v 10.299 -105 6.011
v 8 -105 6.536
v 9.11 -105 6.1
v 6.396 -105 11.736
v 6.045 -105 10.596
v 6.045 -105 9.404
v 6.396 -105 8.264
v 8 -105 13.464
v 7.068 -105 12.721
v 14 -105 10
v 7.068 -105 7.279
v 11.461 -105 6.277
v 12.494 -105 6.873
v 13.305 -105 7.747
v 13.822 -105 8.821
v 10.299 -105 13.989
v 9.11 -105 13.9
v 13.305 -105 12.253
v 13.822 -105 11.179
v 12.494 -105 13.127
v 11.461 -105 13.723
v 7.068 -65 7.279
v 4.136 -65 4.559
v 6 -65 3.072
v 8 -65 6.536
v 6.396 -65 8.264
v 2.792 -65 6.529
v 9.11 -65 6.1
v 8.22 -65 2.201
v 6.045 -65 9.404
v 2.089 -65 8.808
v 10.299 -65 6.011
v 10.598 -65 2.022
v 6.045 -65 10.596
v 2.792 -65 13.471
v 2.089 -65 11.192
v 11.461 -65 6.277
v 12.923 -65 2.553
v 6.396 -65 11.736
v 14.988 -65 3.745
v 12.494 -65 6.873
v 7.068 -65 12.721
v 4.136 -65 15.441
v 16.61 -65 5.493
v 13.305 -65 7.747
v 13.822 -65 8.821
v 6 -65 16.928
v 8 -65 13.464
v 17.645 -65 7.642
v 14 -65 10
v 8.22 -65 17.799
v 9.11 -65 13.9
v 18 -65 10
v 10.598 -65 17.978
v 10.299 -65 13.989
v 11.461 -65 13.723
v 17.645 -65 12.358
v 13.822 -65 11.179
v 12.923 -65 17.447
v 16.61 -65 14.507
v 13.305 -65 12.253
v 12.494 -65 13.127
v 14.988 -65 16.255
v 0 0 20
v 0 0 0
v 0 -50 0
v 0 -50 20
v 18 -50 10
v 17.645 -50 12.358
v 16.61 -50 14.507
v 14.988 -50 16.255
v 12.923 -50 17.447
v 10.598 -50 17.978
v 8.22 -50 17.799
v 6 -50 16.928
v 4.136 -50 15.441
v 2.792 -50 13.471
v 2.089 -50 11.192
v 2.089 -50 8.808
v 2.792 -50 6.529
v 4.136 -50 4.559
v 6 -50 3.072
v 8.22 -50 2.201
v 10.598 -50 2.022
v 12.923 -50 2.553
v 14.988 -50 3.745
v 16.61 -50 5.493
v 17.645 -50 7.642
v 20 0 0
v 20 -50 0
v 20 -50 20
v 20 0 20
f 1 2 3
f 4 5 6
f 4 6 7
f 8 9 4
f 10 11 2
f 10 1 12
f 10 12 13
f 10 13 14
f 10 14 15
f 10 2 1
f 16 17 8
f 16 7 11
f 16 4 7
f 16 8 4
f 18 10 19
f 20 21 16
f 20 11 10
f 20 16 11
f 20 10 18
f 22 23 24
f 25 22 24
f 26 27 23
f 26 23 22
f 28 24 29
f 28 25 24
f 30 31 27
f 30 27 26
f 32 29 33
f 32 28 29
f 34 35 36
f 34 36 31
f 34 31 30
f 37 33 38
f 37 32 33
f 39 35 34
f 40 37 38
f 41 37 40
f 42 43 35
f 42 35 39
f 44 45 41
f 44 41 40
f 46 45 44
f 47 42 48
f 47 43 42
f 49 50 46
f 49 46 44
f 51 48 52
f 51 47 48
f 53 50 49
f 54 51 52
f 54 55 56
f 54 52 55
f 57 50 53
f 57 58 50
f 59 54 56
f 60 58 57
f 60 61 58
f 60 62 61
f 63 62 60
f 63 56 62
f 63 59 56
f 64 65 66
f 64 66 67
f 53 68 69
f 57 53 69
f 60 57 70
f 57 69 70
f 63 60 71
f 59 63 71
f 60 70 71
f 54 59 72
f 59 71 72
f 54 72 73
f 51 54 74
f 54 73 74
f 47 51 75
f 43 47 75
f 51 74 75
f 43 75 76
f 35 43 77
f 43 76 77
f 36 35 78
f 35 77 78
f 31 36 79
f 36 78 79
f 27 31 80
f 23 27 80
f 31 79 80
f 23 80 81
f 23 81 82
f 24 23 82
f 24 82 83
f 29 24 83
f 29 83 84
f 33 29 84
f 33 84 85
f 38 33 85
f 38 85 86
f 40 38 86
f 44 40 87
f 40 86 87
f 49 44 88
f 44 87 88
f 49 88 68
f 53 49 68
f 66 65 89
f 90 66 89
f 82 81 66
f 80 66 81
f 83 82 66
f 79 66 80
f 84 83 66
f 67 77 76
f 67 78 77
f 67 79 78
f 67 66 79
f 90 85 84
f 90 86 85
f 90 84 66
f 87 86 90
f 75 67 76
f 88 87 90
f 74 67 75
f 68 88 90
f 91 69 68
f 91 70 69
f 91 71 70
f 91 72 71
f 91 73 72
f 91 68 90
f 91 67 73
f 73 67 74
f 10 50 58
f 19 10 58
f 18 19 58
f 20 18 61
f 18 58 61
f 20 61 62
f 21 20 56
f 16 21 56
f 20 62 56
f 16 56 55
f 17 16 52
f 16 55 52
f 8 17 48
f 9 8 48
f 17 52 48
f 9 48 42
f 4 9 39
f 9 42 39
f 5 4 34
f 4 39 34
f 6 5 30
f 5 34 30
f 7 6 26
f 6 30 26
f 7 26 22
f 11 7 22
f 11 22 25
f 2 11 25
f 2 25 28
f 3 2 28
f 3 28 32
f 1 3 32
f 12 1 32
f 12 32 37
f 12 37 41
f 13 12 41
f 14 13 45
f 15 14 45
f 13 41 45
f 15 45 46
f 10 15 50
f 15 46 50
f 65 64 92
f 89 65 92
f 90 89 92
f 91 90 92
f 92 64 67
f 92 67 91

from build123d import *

# Parameters (mm, degrees)
F0_W     = 20
F0_H     = 20
F1_DEPTH = 50
F2_R     = 8
F3_DEPTH = 15
F4_R     = 4
F5_DEPTH = 40


with BuildPart() as f1:
    # F0 (on Front) → F1 (new body)
    with BuildSketch(Plane.XZ):
        with Locations((10, 10)):
            Rectangle(F0_W, F0_H)
    extrude(amount=F1_DEPTH)

    # F2 (on face) → F3 (join)
    with BuildSketch(Plane.XZ.offset(50)):
        with Locations((10, 10)):
            Circle(F2_R)
    extrude(amount=F3_DEPTH)

    # F4 (on face) → F5 (join)
    with BuildSketch(Plane.XZ.offset(65)):
        with Locations((10, 10)):
            Circle(F4_R)
    extrude(amount=F5_DEPTH)


solid = f1.part
